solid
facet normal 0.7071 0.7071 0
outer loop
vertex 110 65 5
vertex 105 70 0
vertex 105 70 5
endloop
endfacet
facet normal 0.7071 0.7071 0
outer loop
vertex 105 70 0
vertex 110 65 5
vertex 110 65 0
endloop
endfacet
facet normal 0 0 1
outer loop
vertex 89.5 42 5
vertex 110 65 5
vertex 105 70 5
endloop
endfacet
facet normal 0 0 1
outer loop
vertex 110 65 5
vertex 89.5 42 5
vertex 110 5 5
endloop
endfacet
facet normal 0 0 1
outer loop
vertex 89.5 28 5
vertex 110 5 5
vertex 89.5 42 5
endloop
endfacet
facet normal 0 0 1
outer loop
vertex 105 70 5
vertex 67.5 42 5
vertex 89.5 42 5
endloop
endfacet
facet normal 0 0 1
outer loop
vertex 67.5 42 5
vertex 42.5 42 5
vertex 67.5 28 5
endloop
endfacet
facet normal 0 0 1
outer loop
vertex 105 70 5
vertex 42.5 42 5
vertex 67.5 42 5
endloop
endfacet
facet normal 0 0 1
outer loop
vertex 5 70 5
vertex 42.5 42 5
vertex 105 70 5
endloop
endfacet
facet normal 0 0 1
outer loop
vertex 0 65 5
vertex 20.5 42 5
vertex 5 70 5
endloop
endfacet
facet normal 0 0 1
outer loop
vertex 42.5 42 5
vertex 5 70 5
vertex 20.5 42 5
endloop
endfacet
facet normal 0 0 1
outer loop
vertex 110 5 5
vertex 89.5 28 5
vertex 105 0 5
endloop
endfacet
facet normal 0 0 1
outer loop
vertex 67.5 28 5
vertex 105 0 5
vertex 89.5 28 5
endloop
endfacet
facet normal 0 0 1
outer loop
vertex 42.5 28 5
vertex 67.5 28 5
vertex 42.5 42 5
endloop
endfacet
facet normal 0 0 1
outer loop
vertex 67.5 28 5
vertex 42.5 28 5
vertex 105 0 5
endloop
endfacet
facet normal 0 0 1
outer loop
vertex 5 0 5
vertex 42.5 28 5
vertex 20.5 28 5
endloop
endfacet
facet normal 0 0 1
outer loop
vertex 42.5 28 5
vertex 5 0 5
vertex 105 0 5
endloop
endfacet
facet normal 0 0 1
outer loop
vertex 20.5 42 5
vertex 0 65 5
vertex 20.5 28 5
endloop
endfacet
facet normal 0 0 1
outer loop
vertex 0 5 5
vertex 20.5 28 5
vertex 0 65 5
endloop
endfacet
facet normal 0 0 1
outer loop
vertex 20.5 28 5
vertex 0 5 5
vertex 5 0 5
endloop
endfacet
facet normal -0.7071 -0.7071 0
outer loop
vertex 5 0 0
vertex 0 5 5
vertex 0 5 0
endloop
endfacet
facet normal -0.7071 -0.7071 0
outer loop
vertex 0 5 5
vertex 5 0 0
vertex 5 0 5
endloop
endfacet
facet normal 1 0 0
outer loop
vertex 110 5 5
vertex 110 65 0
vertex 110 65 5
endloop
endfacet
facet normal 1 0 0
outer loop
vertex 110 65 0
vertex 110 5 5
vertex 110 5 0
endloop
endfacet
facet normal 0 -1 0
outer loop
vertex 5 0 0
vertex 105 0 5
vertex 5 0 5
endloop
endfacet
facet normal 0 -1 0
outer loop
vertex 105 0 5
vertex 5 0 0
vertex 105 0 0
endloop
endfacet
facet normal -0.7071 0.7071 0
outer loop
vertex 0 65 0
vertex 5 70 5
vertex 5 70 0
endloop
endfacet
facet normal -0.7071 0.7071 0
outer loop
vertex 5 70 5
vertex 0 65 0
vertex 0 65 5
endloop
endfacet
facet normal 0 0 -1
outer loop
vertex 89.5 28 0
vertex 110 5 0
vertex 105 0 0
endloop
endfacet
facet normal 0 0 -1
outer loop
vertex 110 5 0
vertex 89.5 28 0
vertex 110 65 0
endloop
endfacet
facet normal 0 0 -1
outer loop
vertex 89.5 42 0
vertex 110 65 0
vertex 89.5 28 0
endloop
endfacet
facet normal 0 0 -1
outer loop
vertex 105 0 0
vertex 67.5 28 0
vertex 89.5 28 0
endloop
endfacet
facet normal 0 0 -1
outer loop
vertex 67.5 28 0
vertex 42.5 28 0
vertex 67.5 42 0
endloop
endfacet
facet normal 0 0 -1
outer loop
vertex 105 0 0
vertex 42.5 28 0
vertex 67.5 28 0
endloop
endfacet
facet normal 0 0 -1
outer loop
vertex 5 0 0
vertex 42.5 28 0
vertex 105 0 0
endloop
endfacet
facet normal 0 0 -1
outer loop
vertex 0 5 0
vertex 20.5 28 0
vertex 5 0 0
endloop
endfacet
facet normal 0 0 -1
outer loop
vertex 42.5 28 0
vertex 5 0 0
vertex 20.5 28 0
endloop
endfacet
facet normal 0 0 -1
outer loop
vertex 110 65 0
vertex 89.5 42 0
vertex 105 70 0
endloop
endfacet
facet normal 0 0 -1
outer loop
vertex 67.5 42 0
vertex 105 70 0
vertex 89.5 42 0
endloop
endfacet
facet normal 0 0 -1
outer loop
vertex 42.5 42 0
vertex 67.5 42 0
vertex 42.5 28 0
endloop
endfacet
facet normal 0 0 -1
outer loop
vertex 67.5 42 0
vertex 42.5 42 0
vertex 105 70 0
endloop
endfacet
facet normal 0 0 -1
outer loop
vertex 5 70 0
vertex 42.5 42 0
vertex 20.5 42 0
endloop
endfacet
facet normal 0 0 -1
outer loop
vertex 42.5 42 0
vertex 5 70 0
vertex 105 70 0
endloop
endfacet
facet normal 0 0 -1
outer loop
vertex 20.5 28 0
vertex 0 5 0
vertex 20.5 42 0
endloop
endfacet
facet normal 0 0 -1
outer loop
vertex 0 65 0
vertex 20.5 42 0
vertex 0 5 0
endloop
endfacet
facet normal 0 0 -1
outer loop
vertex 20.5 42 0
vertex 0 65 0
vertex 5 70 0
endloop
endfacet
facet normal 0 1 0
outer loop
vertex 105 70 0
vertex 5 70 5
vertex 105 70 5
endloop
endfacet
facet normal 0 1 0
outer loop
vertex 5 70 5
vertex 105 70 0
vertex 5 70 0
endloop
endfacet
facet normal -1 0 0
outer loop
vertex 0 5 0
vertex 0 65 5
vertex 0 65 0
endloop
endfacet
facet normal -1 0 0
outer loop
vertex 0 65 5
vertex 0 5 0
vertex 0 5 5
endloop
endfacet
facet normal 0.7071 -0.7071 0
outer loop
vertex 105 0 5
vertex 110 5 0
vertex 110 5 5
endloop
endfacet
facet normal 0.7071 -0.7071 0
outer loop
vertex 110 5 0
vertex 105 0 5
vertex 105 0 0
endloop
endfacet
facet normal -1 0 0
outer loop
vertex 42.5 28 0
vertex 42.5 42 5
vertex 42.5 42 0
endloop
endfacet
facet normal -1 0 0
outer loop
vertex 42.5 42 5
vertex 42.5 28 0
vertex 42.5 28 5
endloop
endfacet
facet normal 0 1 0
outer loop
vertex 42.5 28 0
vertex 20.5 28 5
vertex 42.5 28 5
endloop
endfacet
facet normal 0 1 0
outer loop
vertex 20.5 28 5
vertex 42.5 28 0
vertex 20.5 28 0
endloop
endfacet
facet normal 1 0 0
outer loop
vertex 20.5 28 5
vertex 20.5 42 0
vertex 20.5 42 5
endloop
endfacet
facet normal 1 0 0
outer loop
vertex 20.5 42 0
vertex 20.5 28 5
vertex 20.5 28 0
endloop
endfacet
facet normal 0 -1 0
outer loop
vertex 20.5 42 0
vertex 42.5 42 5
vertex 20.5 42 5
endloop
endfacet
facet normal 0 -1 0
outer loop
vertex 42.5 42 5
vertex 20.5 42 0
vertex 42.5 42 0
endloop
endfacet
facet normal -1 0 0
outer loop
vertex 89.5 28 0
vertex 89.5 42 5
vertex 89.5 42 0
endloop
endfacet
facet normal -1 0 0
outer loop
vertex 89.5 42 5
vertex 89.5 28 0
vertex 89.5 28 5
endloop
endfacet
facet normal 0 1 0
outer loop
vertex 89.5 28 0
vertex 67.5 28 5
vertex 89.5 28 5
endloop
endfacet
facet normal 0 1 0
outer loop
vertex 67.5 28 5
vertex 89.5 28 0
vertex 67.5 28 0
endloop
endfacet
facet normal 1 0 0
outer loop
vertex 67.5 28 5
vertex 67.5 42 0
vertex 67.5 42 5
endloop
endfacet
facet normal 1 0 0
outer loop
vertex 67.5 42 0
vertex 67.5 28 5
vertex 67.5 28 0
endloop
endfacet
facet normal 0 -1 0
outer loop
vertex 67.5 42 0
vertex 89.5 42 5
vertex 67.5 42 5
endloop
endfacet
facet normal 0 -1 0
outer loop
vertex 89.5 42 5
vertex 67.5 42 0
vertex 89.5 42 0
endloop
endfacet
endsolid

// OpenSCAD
$fn = 32;

// ----------------------------------------------------------------------
// Windowed plate: 2 voids, 110 x 70 x 5 mm
// ----------------------------------------------------------------------

// --- parameters (mm) ---
plate_l = 110;            // plate length, X
plate_w = 70;             // plate width, Y
plate_t = 5;              // plate thickness, Z
edge_margin = 8;          // wall from the plate edge to any window
windows = 2;              // number of windows in the row
win_l = 22;               // window length
win_w = 14;               // window width
win_pitch = 47;           // window pitch along X
depth_1 = 5;              // depth of void 1 (full thickness = through)
depth_2 = 5;              // depth of void 2 (full thickness = through)
corner_c = 5;             // corner chamfer of the plate

profile = [[5, 0], [105, 0], [110, 5], [110, 65], [105, 70], [5, 70], [0, 65], [0, 5]];  // primary outline, 8 points, counter clockwise
void_1 = [[20.5, 28], [42.5, 28], [42.5, 42], [20.5, 42]];  // window 1 of the row, 4 points
void_2 = [[67.5, 28], [89.5, 28], [89.5, 42], [67.5, 42]];  // window 2 of the row, 4 points

// --- the one profile operation ---
difference() {
  linear_extrude(height = plate_t) polygon(points = profile);
  translate([0, 0, -1])
    linear_extrude(height = plate_t + 2) polygon(points = void_1);
  translate([0, 0, -1])
    linear_extrude(height = plate_t + 2) polygon(points = void_2);
}
